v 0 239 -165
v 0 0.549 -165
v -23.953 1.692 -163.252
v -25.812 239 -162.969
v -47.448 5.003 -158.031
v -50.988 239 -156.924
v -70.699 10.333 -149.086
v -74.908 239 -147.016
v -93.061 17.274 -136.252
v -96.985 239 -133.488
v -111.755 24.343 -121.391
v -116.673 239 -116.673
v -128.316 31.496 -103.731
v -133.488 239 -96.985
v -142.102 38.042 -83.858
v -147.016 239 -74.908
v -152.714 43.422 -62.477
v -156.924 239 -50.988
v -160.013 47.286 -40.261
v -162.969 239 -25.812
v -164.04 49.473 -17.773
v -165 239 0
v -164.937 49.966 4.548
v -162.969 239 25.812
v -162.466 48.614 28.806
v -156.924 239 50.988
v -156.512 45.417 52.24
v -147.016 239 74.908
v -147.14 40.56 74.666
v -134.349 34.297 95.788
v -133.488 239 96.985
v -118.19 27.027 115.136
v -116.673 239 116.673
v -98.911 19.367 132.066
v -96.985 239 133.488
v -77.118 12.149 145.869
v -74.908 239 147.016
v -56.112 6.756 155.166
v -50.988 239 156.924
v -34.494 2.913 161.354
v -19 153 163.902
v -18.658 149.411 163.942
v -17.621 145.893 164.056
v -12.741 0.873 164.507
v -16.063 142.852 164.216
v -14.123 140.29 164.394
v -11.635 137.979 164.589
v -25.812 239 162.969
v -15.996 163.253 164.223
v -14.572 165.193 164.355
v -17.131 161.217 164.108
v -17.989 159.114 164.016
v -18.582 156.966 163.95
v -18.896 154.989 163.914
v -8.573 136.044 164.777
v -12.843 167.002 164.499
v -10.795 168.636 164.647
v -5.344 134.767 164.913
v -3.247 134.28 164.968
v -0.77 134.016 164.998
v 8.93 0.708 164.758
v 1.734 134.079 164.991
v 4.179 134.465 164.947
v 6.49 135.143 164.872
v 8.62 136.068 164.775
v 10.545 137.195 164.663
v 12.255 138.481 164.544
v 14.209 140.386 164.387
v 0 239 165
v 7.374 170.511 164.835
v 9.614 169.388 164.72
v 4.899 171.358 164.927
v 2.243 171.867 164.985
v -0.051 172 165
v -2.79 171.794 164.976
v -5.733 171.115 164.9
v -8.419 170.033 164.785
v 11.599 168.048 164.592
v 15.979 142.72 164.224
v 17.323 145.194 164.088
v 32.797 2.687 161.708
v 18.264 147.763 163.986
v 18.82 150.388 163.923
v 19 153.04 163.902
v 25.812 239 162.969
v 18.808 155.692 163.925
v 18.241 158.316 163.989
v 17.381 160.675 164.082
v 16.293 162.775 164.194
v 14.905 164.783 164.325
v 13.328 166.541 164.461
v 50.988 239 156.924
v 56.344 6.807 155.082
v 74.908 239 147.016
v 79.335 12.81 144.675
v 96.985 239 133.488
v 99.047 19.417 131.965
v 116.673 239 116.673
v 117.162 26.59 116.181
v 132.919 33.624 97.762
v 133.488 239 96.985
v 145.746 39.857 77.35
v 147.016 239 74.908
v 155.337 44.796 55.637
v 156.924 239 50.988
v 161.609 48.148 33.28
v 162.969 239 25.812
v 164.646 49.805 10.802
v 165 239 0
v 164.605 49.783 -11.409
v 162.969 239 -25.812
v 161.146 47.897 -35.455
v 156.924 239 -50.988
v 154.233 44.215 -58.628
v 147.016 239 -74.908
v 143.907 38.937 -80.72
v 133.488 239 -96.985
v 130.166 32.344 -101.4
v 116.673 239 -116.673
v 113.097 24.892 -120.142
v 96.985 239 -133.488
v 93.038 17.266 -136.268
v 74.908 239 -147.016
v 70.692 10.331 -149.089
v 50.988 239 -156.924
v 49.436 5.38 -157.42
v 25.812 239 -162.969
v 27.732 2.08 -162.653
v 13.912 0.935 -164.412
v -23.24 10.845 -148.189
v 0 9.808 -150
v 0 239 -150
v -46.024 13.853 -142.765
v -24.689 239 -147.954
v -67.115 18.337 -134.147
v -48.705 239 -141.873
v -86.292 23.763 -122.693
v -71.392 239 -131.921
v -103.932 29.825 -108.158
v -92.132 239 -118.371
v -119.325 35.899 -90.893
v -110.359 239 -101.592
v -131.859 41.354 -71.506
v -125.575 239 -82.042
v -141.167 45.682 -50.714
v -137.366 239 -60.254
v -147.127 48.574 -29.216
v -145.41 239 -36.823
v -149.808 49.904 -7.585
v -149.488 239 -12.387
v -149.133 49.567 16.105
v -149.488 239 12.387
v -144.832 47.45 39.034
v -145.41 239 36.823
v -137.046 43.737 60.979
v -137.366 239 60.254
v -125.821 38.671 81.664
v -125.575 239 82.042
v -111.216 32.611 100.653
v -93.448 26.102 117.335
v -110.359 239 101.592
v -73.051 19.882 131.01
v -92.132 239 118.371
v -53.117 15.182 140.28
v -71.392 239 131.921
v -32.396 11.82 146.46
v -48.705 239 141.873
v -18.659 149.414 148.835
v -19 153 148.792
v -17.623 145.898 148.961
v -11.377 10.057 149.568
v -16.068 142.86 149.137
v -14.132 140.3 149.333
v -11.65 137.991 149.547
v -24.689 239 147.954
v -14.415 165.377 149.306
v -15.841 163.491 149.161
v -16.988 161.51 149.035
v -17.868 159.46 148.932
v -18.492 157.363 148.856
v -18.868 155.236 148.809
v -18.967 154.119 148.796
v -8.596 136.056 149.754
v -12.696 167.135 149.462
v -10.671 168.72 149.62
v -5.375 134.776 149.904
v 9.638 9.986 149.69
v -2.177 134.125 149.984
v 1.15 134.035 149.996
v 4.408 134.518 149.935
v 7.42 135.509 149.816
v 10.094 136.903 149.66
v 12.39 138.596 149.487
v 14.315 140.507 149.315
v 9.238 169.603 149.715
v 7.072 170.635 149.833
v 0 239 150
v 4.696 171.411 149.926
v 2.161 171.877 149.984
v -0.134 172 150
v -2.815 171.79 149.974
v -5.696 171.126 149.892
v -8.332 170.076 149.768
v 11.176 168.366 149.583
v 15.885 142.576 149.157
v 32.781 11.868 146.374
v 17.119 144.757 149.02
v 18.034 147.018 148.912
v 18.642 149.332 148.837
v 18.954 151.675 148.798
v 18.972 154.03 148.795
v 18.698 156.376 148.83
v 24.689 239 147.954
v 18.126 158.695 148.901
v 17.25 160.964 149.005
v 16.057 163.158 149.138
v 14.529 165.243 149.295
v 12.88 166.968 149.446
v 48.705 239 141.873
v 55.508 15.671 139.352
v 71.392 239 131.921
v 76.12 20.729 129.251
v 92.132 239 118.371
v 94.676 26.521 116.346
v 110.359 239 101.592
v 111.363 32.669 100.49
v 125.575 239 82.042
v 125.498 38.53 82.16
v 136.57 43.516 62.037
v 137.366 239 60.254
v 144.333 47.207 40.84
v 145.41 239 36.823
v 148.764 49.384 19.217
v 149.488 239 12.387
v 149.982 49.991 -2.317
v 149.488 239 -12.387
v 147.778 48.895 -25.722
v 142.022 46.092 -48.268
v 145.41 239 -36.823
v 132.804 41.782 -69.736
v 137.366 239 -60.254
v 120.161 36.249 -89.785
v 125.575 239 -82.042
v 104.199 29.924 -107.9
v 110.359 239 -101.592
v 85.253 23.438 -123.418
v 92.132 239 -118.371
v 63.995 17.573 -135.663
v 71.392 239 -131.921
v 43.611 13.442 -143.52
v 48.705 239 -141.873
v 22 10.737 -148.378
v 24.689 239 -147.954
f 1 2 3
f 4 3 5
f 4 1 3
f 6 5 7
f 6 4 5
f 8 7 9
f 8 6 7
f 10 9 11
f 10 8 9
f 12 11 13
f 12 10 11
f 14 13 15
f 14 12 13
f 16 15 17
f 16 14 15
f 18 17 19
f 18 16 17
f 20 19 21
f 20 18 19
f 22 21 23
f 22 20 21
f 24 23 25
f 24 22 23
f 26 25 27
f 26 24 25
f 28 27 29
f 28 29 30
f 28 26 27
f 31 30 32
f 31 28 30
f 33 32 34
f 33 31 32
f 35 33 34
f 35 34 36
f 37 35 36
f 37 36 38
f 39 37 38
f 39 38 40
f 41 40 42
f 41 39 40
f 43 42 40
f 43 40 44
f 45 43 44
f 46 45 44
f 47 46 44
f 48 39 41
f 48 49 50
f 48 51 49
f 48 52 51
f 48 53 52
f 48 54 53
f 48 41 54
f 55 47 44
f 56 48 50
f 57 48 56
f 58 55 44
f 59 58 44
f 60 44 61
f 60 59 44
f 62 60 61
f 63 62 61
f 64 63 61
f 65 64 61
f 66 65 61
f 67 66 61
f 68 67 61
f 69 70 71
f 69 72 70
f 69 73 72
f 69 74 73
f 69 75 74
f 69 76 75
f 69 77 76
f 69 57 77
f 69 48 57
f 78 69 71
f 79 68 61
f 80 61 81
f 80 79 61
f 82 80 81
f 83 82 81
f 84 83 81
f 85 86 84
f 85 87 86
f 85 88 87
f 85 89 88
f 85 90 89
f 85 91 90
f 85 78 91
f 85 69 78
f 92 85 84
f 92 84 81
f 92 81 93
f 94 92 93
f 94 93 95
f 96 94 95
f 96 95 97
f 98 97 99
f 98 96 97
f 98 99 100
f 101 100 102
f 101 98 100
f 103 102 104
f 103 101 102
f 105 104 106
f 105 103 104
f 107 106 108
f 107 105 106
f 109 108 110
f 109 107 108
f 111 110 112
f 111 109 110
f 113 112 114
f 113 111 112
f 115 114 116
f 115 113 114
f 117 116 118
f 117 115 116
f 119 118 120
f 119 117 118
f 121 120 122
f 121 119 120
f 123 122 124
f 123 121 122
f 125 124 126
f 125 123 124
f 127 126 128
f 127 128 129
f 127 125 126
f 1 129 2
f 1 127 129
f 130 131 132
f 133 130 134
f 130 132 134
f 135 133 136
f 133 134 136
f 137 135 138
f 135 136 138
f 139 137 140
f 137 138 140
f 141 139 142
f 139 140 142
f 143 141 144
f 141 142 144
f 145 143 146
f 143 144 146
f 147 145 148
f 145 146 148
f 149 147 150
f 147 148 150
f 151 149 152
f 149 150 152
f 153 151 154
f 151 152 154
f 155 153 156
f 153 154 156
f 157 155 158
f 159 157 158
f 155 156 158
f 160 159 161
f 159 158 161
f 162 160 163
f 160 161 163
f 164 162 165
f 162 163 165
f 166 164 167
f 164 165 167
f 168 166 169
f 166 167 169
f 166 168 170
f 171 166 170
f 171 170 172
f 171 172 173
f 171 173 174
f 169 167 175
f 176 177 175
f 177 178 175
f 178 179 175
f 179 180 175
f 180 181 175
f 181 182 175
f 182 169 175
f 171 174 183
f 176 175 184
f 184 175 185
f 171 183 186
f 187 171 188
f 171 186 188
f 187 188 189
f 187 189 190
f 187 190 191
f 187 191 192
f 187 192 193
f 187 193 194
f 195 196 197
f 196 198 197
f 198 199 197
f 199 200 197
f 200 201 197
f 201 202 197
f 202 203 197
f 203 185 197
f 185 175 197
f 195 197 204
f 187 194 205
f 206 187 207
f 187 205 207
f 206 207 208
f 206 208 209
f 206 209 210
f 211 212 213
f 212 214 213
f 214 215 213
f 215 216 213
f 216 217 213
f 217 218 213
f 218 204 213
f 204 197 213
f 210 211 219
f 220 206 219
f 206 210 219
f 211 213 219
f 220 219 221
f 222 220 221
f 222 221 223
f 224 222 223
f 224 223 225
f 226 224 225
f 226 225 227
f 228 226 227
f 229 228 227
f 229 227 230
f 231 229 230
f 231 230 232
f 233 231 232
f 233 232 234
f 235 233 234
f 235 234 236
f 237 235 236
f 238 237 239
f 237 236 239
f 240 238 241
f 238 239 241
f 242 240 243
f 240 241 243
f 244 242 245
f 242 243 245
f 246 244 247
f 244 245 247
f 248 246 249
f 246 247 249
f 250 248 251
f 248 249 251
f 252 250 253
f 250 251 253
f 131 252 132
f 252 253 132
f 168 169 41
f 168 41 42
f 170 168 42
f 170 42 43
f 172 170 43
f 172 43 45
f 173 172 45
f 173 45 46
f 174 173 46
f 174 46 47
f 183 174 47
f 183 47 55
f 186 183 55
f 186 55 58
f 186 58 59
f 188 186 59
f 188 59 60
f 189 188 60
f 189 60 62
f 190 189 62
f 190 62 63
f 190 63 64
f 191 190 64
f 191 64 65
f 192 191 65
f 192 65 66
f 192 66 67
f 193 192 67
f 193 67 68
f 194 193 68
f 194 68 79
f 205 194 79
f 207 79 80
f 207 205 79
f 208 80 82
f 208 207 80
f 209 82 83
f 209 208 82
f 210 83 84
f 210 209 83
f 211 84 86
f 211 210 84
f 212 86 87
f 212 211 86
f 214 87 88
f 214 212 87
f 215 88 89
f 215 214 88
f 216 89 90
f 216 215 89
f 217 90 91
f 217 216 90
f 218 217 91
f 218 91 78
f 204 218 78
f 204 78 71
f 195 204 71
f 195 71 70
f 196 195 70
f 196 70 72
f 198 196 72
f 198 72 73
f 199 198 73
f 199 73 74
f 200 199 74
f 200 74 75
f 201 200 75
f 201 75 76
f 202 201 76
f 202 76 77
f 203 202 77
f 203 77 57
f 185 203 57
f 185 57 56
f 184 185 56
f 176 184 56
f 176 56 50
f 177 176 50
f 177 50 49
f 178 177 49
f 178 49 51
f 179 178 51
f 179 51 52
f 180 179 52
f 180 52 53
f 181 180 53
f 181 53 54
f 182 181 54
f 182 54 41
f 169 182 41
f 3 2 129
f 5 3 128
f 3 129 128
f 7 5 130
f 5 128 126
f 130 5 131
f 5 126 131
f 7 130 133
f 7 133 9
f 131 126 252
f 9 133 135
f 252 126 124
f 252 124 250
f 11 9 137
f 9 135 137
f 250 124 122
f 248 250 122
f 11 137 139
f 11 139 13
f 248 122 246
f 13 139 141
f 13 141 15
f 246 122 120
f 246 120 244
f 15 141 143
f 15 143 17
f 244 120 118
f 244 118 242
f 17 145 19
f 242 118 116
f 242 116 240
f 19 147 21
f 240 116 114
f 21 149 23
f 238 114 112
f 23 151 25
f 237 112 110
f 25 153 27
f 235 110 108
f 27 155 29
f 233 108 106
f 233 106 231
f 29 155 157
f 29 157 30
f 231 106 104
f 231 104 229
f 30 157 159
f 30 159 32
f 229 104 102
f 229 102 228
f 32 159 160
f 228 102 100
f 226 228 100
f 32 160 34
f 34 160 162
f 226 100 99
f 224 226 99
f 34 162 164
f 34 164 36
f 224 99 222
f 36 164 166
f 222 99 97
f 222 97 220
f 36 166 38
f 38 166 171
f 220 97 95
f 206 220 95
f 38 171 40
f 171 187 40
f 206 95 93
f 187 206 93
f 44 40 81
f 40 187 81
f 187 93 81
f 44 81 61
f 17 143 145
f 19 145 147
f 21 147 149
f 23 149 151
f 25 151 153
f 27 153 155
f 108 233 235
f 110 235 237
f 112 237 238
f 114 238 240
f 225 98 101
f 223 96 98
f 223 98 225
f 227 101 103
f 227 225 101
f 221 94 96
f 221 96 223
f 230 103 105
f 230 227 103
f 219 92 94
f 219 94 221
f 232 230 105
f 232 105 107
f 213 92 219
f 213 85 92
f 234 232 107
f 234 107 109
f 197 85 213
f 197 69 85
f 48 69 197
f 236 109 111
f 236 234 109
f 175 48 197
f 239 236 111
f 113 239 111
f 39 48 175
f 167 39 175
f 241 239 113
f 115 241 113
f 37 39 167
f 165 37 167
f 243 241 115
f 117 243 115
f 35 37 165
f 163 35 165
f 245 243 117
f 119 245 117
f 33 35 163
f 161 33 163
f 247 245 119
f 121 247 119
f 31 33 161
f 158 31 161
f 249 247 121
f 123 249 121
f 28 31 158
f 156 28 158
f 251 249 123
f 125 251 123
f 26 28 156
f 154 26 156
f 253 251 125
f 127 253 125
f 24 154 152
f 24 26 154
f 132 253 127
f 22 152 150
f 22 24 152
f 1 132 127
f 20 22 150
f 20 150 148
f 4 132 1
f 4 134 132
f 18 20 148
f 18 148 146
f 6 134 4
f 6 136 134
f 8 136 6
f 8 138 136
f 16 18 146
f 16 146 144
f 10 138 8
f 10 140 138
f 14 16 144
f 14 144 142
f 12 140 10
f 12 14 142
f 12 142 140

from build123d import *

# Parameters (mm, degrees)
SKETCH_1_W         = 15
SKETCH_1_H         = 239
SKETCH1_R          = 300
CUT_EXTRUDE1_DEPTH = 2660.902629797
SKETCH2_R          = 19
CUT_EXTRUDE2_DEPTH = 335.022454505


with BuildPart() as part:
    # Эскиз1 → Повернуть1 (revolve)
    with BuildSketch(Plane.XY, mode=Mode.PRIVATE) as revolve_1_sk:
        with Locations((-157.5, 119.5)):
            Rectangle(SKETCH_1_W, SKETCH_1_H)
    revolve(revolve_1_sk.sketch.rotate(Axis((0, 0, 0), (0, 1, 0)), 270), axis=Axis((0, 0, 0), (0, 1, 0)))

    # Sketch1 → Cut-Extrude1 (cut, through all)
    with BuildSketch(Plane(origin=(2479, 0, 0), x_dir=(0, 0, -1), z_dir=(1, 0, 0))):
        with Locations((0, -250)):
            Circle(SKETCH1_R)
    extrude(amount=-CUT_EXTRUDE1_DEPTH, mode=Mode.SUBTRACT)

    # Sketch2 → Cut-Extrude2 (cut, through all)
    with BuildSketch(Plane.XY):
        with Locations(Location((0, 153, 0), (0, 0, 180))):
            Circle(SKETCH2_R)
    extrude(amount=CUT_EXTRUDE2_DEPTH, mode=Mode.SUBTRACT)


solid = part.part
